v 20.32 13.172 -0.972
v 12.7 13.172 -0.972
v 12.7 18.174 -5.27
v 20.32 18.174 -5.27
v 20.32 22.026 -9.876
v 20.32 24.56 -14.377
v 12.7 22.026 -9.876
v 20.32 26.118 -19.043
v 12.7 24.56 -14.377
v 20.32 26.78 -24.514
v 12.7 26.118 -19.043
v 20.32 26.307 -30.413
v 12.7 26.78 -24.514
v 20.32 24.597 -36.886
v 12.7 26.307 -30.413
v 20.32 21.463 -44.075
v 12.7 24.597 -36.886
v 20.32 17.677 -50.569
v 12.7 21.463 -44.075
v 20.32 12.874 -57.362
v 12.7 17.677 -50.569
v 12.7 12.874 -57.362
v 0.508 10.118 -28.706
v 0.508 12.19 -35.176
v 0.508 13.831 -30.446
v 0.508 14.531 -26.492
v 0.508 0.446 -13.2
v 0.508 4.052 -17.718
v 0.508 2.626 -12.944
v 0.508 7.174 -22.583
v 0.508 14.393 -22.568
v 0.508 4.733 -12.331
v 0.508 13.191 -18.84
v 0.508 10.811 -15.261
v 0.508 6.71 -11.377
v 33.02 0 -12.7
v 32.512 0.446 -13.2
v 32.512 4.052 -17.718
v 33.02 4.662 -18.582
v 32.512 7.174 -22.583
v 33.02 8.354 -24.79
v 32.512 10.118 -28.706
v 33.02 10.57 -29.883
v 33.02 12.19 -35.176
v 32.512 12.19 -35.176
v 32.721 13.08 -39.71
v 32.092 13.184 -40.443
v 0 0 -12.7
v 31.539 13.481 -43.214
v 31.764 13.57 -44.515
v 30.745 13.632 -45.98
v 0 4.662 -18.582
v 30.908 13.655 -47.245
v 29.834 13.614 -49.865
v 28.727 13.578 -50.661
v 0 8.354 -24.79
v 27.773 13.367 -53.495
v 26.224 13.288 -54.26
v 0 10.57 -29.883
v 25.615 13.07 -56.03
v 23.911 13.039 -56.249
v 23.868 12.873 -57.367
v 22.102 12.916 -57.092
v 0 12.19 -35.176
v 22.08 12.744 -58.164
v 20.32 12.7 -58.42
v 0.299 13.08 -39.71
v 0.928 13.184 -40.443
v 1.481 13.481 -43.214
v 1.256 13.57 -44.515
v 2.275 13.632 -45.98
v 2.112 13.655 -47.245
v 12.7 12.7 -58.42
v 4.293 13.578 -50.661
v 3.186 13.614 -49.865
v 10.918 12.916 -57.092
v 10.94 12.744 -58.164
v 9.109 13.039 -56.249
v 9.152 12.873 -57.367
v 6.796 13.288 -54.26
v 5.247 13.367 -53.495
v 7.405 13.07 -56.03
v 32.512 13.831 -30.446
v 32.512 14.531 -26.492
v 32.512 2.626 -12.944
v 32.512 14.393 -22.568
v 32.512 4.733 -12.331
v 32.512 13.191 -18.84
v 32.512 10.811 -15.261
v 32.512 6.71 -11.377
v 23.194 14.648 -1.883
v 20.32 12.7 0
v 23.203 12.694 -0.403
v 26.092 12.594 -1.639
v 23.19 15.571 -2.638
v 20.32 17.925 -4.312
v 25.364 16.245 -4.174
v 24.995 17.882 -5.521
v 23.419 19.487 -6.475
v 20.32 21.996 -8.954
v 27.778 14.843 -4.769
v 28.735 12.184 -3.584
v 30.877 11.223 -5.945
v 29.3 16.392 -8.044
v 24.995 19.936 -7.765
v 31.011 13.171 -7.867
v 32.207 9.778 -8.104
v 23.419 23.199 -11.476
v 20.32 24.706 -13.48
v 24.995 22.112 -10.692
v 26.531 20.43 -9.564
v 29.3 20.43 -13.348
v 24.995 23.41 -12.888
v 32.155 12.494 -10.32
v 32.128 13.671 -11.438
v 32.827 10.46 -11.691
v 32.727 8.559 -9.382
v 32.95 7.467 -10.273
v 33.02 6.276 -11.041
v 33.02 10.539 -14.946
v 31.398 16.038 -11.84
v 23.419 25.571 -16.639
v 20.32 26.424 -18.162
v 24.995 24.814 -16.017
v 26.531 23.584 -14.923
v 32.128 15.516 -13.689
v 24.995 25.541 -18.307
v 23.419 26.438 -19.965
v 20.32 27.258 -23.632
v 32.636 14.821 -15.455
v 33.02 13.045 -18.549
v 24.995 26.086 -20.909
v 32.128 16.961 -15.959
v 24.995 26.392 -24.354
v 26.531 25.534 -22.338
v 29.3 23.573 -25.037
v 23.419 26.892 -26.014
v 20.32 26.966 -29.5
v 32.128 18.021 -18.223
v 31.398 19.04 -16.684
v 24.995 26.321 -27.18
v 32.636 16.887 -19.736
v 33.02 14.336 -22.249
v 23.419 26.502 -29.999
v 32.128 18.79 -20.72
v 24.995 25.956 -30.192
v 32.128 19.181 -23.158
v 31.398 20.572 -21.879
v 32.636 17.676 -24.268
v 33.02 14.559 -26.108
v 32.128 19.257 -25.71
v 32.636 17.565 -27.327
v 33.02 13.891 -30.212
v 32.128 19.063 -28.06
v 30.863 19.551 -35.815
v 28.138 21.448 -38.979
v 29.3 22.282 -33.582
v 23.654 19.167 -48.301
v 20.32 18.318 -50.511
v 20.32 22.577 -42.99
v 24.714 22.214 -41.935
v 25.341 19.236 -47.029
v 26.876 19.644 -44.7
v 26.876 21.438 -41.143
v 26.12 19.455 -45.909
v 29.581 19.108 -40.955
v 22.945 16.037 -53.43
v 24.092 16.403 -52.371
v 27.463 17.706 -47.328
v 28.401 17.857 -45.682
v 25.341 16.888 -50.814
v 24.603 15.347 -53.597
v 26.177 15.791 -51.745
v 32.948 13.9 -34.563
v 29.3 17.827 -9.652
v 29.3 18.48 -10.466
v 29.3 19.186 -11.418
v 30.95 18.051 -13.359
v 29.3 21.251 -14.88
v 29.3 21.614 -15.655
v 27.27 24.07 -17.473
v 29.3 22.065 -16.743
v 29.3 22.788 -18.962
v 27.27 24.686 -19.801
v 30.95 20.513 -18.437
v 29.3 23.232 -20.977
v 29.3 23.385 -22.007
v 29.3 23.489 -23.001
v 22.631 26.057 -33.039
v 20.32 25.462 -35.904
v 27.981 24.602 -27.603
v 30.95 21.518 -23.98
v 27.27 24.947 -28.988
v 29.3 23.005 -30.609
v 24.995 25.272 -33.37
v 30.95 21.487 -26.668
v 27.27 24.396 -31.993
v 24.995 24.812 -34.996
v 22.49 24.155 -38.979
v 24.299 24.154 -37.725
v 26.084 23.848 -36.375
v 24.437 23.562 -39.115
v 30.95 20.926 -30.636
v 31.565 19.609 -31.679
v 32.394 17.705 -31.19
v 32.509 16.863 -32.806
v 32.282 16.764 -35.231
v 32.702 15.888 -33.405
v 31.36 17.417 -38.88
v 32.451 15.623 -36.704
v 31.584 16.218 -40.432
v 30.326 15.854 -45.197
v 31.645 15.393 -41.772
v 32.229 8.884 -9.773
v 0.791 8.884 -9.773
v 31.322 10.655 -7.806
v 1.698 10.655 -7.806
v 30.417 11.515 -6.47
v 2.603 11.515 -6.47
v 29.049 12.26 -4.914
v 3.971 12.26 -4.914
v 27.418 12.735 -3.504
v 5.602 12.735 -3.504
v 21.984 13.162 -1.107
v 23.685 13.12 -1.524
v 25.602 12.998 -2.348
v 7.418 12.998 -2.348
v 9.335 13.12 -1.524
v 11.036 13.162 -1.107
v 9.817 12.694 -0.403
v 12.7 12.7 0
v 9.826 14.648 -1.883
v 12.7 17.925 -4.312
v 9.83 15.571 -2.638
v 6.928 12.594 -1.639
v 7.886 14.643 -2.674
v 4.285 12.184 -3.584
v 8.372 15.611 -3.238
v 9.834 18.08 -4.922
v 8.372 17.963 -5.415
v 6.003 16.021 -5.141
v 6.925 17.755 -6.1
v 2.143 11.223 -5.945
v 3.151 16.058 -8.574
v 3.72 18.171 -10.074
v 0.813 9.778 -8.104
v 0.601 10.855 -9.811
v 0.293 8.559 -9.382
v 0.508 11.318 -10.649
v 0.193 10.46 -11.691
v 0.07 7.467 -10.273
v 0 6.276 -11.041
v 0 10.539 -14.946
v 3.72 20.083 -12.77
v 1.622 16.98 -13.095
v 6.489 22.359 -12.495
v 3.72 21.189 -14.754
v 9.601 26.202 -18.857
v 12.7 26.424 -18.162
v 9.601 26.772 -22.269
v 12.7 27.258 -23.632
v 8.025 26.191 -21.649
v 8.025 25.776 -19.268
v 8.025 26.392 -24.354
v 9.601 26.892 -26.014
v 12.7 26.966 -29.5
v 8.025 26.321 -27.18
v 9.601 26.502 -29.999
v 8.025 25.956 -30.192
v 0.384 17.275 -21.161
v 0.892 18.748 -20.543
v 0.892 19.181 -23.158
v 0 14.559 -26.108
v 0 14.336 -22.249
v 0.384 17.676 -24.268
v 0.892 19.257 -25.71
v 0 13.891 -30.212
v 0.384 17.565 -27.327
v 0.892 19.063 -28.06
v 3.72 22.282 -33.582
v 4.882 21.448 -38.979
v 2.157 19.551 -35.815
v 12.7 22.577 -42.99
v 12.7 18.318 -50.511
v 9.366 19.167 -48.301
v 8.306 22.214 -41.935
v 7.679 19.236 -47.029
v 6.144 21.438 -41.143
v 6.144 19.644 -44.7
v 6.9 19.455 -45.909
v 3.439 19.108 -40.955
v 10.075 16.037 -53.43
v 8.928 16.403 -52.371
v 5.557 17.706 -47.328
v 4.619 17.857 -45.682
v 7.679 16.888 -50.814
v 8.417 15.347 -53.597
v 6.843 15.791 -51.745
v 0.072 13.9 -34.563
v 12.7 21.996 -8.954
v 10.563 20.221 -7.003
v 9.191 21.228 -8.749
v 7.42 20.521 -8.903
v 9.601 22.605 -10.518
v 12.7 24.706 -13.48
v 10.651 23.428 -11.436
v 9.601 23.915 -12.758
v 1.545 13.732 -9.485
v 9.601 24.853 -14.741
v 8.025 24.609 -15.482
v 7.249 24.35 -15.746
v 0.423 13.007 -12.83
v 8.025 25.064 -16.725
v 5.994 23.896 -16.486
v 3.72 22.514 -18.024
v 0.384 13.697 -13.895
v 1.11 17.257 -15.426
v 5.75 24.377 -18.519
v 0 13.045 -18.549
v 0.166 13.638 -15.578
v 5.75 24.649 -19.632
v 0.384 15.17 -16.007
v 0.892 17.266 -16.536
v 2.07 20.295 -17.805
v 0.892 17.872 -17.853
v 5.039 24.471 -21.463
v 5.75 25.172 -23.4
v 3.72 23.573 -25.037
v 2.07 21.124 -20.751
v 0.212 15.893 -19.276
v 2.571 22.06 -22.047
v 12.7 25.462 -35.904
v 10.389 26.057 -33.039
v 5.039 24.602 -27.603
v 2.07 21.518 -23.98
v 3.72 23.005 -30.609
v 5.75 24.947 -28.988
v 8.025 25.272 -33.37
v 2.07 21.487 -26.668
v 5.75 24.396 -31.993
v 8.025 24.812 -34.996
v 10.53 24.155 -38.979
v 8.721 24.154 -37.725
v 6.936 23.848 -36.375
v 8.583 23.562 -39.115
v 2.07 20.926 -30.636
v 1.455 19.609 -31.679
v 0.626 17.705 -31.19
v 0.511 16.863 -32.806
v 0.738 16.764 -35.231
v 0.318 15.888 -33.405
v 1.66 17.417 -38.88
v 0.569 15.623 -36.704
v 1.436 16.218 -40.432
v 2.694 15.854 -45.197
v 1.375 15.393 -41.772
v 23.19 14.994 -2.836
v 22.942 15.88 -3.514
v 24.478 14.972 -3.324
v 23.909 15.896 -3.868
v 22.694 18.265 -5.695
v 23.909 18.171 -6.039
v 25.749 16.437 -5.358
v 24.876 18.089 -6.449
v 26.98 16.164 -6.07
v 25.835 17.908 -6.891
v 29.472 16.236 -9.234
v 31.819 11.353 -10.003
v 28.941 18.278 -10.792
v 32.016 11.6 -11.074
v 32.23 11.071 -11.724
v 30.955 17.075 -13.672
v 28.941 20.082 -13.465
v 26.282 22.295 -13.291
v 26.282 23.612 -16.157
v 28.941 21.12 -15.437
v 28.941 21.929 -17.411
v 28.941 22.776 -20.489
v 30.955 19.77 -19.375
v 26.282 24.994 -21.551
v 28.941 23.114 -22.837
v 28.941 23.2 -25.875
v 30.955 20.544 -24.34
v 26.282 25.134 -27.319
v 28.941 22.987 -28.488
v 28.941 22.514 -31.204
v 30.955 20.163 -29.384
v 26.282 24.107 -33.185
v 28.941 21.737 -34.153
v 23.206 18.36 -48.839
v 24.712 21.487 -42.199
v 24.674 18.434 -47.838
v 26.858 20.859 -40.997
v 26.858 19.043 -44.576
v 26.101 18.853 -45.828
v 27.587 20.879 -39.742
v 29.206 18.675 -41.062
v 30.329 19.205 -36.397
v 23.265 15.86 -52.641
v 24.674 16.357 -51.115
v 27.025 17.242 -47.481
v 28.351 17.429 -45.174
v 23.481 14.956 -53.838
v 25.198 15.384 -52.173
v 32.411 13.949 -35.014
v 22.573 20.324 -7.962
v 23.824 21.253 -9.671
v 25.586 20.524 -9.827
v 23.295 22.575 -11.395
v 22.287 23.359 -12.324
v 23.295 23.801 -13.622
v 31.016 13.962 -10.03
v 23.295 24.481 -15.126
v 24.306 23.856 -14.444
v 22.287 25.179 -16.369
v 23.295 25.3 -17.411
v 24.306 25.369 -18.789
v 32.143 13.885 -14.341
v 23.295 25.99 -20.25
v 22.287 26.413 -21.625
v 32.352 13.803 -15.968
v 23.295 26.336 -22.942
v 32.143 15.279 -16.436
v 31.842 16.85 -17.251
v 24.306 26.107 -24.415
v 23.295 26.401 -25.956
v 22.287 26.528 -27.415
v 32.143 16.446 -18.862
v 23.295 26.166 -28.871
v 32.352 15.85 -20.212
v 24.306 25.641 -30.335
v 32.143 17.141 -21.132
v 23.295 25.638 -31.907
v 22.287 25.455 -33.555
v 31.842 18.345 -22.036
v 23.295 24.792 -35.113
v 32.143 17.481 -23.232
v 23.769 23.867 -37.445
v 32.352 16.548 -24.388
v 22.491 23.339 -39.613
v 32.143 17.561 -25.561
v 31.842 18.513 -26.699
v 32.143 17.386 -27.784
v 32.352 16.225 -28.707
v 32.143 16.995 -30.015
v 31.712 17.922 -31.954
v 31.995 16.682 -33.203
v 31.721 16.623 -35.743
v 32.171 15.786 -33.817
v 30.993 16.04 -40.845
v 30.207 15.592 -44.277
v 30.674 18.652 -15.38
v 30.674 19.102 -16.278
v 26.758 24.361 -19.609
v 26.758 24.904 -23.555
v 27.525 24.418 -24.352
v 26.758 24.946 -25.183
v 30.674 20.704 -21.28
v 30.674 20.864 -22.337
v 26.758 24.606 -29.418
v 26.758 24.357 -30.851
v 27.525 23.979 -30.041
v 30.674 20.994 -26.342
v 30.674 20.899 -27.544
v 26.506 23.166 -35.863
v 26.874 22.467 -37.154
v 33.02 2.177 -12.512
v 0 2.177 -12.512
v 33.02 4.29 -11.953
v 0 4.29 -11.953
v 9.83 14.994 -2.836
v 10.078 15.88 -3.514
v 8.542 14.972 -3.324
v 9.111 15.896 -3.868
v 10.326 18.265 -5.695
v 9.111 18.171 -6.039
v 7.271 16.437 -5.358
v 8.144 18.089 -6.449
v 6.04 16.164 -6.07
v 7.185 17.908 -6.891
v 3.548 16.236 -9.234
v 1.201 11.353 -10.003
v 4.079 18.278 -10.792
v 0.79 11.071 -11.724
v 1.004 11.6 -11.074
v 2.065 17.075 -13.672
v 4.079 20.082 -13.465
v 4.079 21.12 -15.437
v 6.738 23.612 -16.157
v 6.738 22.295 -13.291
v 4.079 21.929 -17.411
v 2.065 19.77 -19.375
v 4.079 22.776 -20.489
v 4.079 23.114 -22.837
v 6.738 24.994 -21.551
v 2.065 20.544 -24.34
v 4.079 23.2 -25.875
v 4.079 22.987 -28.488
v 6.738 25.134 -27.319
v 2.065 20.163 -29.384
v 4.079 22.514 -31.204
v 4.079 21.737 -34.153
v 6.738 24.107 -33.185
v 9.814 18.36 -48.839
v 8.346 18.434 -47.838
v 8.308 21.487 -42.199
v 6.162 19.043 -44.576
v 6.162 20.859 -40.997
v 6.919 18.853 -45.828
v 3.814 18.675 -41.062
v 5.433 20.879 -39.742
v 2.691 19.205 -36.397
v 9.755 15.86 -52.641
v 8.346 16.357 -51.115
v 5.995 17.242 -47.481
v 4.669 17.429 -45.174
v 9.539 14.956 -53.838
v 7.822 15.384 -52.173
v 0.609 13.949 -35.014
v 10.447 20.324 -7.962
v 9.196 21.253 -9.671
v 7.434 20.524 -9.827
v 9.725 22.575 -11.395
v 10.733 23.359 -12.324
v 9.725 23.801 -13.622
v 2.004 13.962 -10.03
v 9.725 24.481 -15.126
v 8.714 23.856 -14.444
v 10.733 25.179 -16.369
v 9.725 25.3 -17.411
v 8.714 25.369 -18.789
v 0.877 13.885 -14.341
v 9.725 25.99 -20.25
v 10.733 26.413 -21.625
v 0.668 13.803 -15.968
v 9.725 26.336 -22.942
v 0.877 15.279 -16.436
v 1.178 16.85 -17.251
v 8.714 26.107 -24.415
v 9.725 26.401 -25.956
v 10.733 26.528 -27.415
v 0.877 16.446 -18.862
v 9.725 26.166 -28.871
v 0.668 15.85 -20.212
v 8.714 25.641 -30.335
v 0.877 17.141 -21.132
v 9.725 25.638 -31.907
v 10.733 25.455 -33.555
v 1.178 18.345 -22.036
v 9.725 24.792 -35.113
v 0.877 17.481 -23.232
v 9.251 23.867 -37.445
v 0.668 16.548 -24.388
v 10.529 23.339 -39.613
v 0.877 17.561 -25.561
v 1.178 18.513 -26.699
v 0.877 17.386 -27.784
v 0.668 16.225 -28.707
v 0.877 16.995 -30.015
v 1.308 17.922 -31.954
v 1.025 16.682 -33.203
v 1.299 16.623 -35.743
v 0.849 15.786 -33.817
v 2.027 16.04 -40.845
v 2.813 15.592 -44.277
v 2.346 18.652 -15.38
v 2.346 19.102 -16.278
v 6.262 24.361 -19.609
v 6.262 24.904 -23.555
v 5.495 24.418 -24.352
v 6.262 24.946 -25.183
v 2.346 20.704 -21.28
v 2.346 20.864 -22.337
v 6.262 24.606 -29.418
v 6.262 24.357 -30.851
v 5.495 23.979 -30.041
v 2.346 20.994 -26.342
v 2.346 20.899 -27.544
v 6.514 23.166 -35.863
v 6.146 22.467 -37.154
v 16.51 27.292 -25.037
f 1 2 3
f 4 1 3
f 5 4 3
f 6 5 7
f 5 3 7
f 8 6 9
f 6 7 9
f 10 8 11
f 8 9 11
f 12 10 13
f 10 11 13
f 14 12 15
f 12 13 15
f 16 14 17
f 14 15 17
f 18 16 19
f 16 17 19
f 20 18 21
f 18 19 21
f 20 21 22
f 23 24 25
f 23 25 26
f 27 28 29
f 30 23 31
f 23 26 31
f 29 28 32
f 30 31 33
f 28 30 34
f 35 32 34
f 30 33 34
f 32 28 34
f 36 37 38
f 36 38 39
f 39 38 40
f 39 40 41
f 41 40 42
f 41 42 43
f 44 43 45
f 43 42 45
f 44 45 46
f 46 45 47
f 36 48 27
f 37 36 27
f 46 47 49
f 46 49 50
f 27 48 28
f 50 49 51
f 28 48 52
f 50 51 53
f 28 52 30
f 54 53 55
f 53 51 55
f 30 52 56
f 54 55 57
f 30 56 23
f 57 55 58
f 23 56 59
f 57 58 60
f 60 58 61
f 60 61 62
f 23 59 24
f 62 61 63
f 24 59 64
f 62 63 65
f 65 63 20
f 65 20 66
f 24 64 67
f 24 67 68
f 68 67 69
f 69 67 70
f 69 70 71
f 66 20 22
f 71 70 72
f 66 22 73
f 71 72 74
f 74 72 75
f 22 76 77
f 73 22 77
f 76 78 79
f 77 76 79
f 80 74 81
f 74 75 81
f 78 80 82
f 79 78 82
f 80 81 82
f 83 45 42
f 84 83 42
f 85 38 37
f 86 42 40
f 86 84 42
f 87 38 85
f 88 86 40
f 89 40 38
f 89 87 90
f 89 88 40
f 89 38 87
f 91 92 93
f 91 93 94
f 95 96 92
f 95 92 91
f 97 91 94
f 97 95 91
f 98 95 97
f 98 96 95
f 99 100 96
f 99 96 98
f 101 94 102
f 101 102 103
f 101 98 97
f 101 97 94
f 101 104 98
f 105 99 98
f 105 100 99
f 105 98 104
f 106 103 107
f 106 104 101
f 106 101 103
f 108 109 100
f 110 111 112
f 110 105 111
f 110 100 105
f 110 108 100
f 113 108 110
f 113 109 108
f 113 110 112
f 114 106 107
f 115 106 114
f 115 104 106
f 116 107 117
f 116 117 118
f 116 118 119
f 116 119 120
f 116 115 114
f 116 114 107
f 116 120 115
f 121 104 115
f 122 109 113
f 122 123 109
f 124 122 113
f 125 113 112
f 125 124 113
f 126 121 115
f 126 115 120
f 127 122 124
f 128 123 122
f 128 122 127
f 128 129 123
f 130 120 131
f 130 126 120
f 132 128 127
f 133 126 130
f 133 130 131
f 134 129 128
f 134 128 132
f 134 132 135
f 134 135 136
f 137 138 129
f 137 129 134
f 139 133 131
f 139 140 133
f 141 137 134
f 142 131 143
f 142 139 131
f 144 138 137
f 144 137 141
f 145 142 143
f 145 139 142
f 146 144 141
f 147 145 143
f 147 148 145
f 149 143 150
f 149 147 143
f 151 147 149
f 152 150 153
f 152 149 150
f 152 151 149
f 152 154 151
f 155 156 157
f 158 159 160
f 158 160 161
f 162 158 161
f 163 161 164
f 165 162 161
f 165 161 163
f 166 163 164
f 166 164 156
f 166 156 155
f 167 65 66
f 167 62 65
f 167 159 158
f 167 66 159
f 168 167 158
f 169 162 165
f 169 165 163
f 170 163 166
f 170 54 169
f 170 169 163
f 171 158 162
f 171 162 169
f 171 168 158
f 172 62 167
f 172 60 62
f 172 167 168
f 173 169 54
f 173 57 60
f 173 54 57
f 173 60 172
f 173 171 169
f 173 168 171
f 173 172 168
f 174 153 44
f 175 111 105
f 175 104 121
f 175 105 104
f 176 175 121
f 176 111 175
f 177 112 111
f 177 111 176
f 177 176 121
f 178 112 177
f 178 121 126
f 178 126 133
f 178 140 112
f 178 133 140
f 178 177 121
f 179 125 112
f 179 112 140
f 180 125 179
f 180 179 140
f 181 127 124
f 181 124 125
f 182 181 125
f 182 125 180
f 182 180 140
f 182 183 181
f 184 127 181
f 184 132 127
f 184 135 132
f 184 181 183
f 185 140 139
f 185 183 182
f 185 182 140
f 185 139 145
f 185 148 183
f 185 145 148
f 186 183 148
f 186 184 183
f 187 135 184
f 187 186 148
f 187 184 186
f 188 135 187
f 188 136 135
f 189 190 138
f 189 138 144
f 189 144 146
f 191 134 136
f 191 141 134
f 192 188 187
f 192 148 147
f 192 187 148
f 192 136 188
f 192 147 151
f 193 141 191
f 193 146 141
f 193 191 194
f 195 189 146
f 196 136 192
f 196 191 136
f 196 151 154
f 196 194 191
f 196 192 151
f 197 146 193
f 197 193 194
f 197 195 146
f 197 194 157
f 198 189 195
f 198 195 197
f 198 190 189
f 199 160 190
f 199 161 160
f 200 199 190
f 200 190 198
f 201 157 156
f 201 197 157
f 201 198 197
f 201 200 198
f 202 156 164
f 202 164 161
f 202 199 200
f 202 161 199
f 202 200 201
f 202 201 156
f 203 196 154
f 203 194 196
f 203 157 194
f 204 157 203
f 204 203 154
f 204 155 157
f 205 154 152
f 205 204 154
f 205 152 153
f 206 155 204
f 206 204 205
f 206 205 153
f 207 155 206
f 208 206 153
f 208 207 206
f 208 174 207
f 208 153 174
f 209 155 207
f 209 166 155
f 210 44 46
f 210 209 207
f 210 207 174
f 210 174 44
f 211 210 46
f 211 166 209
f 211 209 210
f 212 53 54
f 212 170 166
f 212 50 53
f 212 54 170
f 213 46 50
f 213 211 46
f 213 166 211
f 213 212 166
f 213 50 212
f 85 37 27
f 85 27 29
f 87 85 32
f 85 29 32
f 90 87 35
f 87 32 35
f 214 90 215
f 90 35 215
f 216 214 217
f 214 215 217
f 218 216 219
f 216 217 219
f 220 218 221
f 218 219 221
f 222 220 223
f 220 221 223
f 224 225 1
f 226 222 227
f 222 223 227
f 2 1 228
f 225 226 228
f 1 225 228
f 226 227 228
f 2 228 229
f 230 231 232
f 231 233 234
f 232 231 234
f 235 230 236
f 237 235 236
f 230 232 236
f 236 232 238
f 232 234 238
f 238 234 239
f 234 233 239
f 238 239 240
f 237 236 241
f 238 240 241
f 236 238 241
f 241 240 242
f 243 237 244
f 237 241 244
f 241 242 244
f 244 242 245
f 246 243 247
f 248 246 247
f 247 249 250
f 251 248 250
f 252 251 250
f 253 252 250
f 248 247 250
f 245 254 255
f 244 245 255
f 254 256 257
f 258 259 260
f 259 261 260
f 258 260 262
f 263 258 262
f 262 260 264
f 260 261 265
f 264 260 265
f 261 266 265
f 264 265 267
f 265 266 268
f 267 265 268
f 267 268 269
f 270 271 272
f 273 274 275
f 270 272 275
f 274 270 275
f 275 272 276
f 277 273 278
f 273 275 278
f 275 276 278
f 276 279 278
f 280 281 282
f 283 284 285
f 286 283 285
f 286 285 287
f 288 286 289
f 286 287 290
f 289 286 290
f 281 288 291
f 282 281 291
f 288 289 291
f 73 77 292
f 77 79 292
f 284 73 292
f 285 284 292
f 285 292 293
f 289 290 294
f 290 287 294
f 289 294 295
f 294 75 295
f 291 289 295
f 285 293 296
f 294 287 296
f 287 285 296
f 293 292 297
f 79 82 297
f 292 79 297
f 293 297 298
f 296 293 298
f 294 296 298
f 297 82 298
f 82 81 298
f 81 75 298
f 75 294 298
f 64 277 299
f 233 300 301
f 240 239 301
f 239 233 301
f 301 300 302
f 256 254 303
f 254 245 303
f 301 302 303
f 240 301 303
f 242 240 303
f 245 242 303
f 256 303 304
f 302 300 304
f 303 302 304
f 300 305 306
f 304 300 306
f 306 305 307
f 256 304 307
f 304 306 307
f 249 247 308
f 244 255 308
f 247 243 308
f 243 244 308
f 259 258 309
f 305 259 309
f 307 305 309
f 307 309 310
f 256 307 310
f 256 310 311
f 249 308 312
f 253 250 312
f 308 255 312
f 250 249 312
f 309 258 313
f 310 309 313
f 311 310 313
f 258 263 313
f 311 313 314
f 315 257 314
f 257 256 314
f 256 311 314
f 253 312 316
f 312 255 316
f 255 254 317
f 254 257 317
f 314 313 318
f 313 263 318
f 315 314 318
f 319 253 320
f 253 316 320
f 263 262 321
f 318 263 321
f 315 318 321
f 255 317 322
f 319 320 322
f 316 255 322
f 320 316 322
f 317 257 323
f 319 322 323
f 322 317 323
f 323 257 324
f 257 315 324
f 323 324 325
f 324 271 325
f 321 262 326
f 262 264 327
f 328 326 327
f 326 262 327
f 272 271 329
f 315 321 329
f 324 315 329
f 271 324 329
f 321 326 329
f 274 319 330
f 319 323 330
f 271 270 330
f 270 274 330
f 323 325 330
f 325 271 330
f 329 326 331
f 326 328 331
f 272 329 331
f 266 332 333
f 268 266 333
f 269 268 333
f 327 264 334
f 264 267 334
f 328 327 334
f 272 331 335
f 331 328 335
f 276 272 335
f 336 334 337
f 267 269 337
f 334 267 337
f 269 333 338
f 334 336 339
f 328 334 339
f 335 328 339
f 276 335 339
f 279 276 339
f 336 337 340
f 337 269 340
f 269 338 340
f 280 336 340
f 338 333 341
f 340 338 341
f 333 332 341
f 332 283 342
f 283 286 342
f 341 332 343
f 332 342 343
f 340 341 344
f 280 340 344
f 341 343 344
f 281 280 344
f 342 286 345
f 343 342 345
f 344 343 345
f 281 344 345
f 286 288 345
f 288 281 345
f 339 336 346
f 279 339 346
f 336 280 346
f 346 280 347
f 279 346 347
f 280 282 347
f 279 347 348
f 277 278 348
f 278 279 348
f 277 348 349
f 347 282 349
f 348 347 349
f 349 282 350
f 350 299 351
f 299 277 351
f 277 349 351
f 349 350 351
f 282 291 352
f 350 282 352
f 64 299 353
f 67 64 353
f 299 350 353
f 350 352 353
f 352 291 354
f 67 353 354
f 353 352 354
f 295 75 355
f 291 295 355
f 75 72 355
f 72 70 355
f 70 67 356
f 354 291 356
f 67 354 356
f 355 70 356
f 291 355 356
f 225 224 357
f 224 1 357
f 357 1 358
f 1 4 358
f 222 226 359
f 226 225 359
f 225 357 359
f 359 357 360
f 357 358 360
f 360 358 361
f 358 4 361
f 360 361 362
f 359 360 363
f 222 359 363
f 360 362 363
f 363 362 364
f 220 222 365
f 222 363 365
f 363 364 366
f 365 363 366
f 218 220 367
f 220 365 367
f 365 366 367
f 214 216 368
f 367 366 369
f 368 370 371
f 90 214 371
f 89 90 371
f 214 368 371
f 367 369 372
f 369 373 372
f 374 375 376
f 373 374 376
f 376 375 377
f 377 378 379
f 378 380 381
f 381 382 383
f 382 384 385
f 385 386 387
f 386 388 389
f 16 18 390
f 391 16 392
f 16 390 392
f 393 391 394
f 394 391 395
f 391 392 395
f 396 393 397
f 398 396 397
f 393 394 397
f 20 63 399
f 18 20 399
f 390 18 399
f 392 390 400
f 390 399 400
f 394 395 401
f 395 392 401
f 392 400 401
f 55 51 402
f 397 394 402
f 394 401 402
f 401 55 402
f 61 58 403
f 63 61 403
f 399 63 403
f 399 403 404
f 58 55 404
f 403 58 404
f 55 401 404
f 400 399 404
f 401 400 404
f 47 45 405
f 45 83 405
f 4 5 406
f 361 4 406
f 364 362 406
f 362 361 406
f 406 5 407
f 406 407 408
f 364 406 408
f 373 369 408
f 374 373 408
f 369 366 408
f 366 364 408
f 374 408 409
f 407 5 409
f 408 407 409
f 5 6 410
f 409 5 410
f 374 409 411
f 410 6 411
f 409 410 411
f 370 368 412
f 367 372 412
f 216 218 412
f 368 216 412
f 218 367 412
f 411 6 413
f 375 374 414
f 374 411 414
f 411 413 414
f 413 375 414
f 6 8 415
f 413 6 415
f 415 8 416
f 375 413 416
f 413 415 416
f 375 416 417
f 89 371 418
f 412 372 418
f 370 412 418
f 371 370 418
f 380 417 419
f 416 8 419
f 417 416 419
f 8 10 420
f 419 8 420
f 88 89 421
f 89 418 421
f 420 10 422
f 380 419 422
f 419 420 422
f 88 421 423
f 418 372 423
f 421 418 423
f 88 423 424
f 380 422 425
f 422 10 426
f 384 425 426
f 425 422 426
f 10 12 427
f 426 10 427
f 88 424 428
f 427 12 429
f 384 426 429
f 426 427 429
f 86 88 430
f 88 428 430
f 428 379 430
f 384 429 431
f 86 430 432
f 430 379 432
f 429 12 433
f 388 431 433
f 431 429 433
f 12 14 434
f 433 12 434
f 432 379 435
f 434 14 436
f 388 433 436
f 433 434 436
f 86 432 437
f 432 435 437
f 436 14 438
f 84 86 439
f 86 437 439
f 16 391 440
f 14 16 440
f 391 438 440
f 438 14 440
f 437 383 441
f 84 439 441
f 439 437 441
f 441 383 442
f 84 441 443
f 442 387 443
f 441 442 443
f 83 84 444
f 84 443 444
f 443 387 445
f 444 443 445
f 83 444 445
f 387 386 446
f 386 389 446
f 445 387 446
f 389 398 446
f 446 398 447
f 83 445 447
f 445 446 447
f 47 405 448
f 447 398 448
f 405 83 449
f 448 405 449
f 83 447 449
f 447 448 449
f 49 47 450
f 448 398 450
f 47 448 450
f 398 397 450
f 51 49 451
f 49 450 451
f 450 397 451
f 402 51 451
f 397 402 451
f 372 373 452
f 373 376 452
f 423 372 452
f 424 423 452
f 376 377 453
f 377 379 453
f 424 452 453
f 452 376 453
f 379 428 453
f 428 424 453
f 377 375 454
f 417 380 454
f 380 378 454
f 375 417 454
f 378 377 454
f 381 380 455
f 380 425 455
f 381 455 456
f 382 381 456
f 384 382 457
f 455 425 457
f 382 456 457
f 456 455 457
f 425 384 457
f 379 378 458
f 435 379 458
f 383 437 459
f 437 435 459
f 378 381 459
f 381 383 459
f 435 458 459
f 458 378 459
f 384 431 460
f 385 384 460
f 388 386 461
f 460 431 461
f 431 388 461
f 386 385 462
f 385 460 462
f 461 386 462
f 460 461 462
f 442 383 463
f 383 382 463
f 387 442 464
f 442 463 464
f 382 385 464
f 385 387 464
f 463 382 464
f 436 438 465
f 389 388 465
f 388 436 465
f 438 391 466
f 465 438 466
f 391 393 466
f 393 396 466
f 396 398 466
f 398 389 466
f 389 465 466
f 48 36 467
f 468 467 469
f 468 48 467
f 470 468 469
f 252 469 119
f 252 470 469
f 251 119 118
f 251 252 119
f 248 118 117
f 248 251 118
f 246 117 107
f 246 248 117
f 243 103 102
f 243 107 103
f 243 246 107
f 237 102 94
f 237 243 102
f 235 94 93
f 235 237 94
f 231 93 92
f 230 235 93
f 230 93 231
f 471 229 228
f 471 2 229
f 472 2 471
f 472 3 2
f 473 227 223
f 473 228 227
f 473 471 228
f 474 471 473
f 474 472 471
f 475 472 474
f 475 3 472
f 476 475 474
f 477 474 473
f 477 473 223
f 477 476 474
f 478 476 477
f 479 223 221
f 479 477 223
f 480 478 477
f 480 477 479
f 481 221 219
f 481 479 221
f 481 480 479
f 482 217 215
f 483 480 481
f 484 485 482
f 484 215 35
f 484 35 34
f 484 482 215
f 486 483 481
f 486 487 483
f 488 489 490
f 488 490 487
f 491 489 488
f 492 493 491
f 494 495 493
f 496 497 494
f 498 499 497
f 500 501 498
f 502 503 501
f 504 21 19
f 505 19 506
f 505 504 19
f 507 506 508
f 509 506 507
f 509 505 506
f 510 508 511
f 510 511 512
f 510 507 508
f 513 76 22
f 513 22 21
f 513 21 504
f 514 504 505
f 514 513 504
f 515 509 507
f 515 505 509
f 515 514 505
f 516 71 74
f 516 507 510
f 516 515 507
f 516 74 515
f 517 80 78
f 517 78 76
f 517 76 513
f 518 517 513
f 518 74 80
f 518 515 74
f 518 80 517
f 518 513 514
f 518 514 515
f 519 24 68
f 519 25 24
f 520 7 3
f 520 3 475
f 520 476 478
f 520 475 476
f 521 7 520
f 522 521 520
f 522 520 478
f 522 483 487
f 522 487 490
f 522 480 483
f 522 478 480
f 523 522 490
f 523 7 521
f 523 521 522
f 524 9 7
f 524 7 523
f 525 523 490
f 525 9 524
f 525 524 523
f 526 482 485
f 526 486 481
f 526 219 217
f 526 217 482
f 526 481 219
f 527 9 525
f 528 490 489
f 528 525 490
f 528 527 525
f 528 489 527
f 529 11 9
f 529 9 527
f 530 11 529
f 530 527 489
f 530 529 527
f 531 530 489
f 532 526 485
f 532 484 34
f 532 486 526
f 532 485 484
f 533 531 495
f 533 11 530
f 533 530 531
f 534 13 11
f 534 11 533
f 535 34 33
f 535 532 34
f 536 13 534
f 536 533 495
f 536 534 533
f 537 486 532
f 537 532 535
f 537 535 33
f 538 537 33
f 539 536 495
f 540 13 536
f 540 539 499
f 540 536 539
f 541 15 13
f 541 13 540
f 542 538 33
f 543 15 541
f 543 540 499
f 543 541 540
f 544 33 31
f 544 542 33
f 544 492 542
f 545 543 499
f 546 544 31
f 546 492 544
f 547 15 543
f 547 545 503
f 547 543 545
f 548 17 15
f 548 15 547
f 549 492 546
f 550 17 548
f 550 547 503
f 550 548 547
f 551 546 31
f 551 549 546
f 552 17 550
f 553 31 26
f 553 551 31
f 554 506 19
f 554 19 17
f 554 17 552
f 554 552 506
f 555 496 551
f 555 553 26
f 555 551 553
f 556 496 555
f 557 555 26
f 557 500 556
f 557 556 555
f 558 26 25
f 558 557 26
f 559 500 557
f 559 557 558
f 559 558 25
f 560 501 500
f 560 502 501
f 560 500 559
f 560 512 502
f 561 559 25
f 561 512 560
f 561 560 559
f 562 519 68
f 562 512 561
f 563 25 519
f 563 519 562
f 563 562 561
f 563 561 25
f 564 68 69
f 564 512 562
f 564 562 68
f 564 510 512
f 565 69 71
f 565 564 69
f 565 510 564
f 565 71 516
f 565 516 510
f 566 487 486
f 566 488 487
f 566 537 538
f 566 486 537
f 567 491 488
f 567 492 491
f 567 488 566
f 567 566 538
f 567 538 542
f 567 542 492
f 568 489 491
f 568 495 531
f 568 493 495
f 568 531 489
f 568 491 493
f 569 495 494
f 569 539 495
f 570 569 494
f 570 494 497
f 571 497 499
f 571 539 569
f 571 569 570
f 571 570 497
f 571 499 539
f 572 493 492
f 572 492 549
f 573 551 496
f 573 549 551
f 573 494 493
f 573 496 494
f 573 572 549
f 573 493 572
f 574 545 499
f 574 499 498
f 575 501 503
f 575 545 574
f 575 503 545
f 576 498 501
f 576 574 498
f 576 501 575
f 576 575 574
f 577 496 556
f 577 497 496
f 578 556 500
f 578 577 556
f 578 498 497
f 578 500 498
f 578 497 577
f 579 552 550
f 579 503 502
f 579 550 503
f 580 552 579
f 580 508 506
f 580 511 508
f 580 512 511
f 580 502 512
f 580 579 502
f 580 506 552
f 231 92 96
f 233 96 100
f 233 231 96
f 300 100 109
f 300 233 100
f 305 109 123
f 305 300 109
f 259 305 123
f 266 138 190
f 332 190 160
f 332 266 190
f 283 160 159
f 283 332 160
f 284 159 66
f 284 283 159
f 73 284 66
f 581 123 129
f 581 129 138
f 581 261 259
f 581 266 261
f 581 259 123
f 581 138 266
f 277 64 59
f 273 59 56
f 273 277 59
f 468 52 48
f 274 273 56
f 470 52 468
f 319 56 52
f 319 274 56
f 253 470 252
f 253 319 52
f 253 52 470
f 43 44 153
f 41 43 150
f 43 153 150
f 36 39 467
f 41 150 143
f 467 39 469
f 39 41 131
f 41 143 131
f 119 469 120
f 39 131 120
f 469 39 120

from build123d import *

# Parameters (mm, degrees)
BOSS_EXTRUDE1_DEPTH = 33.02
FILLET1_R           = 12.7
SHELL1_T            = -0.508


with BuildPart() as part:
    # Sketch1 → Boss-Extrude1 (new body)
    with BuildSketch(Plane(origin=(0, 0, 0), x_dir=(0, 0, -1), z_dir=(1, 0, 0))):
        with BuildLine():
            ThreePointArc((12.7, 0), (8.980256121, 8.980256121), (0, 12.7))
            add(Edge.make_bspline(
                [(0, 12.7), (20.864402494, 41.884638656), (58.42, 12.7)],
                knots=[0, 0, 0, 1, 1, 1], degree=2))
            add(Edge.make_bspline(
                [(12.7, 0), (31.891163141, 17.27124085), (58.42, 12.7)],
                knots=[0, 0, 0, 1, 1, 1], degree=2))
        make_face()
    extrude(amount=BOSS_EXTRUDE1_DEPTH)

    # Fillet1
    fillet1_edges = [part.edges().sort_by_distance(p)[0] for p in [
        (0, 27.096981156, -28.472641607),
        (33.02, 27.096981156, -28.472641607),
    ]]
    fillet(fillet1_edges, radius=FILLET1_R)

    # Shell1
    shell1_openings = [part.faces().sort_by_distance(p)[0] for p in [
        (16.58654835, 6.565370086, -33.984689517),
    ]]
    offset(amount=SHELL1_T, openings=shell1_openings, kind=Kind.INTERSECTION)


solid = part.part
